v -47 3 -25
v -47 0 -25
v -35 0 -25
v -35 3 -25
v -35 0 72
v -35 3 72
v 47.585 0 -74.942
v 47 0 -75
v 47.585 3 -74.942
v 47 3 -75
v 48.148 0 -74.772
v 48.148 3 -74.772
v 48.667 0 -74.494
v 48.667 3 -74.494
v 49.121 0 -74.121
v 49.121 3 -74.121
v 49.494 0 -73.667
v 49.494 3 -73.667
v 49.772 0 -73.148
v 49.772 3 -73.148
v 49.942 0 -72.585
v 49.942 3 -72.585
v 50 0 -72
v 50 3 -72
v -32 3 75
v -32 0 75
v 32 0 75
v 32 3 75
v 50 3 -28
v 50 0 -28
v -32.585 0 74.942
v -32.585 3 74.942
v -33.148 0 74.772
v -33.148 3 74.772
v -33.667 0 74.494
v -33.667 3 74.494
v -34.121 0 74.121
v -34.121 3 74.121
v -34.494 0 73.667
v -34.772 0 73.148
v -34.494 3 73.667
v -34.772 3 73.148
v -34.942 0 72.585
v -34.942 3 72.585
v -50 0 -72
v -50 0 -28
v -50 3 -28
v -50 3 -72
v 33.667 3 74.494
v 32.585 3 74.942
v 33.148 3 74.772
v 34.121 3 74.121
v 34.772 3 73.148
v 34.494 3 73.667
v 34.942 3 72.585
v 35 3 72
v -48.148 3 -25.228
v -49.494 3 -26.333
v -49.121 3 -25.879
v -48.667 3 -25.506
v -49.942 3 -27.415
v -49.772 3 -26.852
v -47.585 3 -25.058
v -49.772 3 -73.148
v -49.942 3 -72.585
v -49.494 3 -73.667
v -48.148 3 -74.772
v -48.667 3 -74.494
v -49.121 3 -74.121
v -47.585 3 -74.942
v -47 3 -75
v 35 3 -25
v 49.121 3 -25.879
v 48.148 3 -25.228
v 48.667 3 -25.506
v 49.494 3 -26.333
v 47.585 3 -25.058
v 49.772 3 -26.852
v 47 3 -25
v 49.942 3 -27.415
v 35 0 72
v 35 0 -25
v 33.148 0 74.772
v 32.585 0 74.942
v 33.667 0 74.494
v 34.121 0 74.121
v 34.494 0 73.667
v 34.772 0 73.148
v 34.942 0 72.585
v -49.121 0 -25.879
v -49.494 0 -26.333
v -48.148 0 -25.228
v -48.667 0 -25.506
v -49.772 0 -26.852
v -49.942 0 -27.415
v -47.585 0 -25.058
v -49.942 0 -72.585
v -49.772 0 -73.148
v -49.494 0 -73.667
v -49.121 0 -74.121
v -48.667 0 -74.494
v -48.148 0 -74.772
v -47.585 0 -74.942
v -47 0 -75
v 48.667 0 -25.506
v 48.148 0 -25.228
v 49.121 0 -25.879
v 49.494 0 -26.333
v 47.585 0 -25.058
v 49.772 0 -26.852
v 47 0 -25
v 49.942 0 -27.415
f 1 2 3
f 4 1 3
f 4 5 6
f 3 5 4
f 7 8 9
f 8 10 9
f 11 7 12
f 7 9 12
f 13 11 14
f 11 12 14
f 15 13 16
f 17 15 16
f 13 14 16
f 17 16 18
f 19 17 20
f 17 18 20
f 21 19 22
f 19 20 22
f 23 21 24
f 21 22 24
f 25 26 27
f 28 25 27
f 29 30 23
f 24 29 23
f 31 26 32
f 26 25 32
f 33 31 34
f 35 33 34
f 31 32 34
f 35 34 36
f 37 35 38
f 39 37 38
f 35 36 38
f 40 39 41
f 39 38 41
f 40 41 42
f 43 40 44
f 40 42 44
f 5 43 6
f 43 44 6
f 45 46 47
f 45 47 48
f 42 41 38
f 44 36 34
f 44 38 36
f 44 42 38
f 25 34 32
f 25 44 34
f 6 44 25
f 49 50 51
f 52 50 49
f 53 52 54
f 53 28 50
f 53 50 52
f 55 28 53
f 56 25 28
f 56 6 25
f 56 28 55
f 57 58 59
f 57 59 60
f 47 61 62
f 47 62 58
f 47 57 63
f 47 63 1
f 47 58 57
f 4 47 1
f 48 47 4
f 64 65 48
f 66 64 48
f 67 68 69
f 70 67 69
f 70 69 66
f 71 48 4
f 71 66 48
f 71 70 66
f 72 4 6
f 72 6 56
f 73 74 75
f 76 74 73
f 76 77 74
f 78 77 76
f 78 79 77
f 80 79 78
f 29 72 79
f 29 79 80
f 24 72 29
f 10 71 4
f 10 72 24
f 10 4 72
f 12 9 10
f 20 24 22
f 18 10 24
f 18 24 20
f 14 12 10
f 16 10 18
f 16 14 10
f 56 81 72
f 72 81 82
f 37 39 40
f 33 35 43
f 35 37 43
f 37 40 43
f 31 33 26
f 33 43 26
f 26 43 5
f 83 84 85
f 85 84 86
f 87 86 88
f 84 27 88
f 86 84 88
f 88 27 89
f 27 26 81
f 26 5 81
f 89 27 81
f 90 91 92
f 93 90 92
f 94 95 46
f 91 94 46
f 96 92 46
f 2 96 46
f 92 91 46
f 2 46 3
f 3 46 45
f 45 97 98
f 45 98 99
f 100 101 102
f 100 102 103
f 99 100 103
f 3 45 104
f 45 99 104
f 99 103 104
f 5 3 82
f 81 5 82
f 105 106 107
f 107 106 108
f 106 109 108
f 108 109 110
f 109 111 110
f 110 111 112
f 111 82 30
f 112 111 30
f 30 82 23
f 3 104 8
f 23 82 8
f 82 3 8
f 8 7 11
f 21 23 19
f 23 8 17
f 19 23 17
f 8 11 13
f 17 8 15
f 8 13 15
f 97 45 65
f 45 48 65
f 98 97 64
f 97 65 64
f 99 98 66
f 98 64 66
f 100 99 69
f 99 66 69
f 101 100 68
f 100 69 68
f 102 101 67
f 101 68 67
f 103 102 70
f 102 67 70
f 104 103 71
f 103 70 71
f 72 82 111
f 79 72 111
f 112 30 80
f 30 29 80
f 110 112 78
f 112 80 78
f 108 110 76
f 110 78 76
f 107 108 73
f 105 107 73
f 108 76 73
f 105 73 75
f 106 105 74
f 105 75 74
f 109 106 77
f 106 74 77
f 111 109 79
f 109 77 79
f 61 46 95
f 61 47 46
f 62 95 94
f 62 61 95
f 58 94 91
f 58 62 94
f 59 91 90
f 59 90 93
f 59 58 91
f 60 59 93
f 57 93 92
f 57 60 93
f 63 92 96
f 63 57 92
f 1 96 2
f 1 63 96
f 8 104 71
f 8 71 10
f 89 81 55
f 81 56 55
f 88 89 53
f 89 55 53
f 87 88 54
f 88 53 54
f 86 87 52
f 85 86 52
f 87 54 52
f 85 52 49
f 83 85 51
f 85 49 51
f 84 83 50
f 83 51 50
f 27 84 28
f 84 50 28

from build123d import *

# Parameters (mm, degrees)
CROQUIS1_W                 = 100
CROQUIS1_H                 = 150
SALIENTE_EXTRUIR2_DEPTH    = 3
CORTAR_EXTRUIR1_DEPTH      = 91.188691087
CORTAR_EXTRUIR1_DEPTH_BACK = 91.188691087
CROQUIS2_W                 = 15
CROQUIS2_H                 = 100
REDONDEO1_R                = 3


with BuildPart() as part:
    # Croquis1 → Saliente-Extruir2 (new body)
    with BuildSketch(Plane(origin=(0, 0, 0), x_dir=(1, 0, 0), z_dir=(0, 1, 0))):
        Rectangle(CROQUIS1_W, CROQUIS1_H)
    extrude(amount=SALIENTE_EXTRUIR2_DEPTH)

    # Croquis2 → Cortar-Extruir1 (cut, two sides: drawn at the far end of the back side and taken through both)
    with BuildSketch(Plane(origin=(0, 3, 0), x_dir=(1, 0, 0), z_dir=(0, 1, 0)).offset(-CORTAR_EXTRUIR1_DEPTH_BACK)):
        with Locations((-42.5, -25)):
            Rectangle(CROQUIS2_W, CROQUIS2_H)
        with Locations((42.5, -25)):
            Rectangle(CROQUIS2_W, CROQUIS2_H)
    extrude(amount=CORTAR_EXTRUIR1_DEPTH + CORTAR_EXTRUIR1_DEPTH_BACK, mode=Mode.SUBTRACT)

    # Redondeo1
    redondeo1_edges = [part.edges().sort_by_distance(p)[0] for p in [
        (-50, 1.5, -25),
        (-35, 1.5, 75),
        (50, 1.5, -25),
        (35, 1.5, 75),
        (-50, 1.5, -75),
        (50, 1.5, -75),
    ]]
    fillet(redondeo1_edges, radius=REDONDEO1_R)


solid = part.part
